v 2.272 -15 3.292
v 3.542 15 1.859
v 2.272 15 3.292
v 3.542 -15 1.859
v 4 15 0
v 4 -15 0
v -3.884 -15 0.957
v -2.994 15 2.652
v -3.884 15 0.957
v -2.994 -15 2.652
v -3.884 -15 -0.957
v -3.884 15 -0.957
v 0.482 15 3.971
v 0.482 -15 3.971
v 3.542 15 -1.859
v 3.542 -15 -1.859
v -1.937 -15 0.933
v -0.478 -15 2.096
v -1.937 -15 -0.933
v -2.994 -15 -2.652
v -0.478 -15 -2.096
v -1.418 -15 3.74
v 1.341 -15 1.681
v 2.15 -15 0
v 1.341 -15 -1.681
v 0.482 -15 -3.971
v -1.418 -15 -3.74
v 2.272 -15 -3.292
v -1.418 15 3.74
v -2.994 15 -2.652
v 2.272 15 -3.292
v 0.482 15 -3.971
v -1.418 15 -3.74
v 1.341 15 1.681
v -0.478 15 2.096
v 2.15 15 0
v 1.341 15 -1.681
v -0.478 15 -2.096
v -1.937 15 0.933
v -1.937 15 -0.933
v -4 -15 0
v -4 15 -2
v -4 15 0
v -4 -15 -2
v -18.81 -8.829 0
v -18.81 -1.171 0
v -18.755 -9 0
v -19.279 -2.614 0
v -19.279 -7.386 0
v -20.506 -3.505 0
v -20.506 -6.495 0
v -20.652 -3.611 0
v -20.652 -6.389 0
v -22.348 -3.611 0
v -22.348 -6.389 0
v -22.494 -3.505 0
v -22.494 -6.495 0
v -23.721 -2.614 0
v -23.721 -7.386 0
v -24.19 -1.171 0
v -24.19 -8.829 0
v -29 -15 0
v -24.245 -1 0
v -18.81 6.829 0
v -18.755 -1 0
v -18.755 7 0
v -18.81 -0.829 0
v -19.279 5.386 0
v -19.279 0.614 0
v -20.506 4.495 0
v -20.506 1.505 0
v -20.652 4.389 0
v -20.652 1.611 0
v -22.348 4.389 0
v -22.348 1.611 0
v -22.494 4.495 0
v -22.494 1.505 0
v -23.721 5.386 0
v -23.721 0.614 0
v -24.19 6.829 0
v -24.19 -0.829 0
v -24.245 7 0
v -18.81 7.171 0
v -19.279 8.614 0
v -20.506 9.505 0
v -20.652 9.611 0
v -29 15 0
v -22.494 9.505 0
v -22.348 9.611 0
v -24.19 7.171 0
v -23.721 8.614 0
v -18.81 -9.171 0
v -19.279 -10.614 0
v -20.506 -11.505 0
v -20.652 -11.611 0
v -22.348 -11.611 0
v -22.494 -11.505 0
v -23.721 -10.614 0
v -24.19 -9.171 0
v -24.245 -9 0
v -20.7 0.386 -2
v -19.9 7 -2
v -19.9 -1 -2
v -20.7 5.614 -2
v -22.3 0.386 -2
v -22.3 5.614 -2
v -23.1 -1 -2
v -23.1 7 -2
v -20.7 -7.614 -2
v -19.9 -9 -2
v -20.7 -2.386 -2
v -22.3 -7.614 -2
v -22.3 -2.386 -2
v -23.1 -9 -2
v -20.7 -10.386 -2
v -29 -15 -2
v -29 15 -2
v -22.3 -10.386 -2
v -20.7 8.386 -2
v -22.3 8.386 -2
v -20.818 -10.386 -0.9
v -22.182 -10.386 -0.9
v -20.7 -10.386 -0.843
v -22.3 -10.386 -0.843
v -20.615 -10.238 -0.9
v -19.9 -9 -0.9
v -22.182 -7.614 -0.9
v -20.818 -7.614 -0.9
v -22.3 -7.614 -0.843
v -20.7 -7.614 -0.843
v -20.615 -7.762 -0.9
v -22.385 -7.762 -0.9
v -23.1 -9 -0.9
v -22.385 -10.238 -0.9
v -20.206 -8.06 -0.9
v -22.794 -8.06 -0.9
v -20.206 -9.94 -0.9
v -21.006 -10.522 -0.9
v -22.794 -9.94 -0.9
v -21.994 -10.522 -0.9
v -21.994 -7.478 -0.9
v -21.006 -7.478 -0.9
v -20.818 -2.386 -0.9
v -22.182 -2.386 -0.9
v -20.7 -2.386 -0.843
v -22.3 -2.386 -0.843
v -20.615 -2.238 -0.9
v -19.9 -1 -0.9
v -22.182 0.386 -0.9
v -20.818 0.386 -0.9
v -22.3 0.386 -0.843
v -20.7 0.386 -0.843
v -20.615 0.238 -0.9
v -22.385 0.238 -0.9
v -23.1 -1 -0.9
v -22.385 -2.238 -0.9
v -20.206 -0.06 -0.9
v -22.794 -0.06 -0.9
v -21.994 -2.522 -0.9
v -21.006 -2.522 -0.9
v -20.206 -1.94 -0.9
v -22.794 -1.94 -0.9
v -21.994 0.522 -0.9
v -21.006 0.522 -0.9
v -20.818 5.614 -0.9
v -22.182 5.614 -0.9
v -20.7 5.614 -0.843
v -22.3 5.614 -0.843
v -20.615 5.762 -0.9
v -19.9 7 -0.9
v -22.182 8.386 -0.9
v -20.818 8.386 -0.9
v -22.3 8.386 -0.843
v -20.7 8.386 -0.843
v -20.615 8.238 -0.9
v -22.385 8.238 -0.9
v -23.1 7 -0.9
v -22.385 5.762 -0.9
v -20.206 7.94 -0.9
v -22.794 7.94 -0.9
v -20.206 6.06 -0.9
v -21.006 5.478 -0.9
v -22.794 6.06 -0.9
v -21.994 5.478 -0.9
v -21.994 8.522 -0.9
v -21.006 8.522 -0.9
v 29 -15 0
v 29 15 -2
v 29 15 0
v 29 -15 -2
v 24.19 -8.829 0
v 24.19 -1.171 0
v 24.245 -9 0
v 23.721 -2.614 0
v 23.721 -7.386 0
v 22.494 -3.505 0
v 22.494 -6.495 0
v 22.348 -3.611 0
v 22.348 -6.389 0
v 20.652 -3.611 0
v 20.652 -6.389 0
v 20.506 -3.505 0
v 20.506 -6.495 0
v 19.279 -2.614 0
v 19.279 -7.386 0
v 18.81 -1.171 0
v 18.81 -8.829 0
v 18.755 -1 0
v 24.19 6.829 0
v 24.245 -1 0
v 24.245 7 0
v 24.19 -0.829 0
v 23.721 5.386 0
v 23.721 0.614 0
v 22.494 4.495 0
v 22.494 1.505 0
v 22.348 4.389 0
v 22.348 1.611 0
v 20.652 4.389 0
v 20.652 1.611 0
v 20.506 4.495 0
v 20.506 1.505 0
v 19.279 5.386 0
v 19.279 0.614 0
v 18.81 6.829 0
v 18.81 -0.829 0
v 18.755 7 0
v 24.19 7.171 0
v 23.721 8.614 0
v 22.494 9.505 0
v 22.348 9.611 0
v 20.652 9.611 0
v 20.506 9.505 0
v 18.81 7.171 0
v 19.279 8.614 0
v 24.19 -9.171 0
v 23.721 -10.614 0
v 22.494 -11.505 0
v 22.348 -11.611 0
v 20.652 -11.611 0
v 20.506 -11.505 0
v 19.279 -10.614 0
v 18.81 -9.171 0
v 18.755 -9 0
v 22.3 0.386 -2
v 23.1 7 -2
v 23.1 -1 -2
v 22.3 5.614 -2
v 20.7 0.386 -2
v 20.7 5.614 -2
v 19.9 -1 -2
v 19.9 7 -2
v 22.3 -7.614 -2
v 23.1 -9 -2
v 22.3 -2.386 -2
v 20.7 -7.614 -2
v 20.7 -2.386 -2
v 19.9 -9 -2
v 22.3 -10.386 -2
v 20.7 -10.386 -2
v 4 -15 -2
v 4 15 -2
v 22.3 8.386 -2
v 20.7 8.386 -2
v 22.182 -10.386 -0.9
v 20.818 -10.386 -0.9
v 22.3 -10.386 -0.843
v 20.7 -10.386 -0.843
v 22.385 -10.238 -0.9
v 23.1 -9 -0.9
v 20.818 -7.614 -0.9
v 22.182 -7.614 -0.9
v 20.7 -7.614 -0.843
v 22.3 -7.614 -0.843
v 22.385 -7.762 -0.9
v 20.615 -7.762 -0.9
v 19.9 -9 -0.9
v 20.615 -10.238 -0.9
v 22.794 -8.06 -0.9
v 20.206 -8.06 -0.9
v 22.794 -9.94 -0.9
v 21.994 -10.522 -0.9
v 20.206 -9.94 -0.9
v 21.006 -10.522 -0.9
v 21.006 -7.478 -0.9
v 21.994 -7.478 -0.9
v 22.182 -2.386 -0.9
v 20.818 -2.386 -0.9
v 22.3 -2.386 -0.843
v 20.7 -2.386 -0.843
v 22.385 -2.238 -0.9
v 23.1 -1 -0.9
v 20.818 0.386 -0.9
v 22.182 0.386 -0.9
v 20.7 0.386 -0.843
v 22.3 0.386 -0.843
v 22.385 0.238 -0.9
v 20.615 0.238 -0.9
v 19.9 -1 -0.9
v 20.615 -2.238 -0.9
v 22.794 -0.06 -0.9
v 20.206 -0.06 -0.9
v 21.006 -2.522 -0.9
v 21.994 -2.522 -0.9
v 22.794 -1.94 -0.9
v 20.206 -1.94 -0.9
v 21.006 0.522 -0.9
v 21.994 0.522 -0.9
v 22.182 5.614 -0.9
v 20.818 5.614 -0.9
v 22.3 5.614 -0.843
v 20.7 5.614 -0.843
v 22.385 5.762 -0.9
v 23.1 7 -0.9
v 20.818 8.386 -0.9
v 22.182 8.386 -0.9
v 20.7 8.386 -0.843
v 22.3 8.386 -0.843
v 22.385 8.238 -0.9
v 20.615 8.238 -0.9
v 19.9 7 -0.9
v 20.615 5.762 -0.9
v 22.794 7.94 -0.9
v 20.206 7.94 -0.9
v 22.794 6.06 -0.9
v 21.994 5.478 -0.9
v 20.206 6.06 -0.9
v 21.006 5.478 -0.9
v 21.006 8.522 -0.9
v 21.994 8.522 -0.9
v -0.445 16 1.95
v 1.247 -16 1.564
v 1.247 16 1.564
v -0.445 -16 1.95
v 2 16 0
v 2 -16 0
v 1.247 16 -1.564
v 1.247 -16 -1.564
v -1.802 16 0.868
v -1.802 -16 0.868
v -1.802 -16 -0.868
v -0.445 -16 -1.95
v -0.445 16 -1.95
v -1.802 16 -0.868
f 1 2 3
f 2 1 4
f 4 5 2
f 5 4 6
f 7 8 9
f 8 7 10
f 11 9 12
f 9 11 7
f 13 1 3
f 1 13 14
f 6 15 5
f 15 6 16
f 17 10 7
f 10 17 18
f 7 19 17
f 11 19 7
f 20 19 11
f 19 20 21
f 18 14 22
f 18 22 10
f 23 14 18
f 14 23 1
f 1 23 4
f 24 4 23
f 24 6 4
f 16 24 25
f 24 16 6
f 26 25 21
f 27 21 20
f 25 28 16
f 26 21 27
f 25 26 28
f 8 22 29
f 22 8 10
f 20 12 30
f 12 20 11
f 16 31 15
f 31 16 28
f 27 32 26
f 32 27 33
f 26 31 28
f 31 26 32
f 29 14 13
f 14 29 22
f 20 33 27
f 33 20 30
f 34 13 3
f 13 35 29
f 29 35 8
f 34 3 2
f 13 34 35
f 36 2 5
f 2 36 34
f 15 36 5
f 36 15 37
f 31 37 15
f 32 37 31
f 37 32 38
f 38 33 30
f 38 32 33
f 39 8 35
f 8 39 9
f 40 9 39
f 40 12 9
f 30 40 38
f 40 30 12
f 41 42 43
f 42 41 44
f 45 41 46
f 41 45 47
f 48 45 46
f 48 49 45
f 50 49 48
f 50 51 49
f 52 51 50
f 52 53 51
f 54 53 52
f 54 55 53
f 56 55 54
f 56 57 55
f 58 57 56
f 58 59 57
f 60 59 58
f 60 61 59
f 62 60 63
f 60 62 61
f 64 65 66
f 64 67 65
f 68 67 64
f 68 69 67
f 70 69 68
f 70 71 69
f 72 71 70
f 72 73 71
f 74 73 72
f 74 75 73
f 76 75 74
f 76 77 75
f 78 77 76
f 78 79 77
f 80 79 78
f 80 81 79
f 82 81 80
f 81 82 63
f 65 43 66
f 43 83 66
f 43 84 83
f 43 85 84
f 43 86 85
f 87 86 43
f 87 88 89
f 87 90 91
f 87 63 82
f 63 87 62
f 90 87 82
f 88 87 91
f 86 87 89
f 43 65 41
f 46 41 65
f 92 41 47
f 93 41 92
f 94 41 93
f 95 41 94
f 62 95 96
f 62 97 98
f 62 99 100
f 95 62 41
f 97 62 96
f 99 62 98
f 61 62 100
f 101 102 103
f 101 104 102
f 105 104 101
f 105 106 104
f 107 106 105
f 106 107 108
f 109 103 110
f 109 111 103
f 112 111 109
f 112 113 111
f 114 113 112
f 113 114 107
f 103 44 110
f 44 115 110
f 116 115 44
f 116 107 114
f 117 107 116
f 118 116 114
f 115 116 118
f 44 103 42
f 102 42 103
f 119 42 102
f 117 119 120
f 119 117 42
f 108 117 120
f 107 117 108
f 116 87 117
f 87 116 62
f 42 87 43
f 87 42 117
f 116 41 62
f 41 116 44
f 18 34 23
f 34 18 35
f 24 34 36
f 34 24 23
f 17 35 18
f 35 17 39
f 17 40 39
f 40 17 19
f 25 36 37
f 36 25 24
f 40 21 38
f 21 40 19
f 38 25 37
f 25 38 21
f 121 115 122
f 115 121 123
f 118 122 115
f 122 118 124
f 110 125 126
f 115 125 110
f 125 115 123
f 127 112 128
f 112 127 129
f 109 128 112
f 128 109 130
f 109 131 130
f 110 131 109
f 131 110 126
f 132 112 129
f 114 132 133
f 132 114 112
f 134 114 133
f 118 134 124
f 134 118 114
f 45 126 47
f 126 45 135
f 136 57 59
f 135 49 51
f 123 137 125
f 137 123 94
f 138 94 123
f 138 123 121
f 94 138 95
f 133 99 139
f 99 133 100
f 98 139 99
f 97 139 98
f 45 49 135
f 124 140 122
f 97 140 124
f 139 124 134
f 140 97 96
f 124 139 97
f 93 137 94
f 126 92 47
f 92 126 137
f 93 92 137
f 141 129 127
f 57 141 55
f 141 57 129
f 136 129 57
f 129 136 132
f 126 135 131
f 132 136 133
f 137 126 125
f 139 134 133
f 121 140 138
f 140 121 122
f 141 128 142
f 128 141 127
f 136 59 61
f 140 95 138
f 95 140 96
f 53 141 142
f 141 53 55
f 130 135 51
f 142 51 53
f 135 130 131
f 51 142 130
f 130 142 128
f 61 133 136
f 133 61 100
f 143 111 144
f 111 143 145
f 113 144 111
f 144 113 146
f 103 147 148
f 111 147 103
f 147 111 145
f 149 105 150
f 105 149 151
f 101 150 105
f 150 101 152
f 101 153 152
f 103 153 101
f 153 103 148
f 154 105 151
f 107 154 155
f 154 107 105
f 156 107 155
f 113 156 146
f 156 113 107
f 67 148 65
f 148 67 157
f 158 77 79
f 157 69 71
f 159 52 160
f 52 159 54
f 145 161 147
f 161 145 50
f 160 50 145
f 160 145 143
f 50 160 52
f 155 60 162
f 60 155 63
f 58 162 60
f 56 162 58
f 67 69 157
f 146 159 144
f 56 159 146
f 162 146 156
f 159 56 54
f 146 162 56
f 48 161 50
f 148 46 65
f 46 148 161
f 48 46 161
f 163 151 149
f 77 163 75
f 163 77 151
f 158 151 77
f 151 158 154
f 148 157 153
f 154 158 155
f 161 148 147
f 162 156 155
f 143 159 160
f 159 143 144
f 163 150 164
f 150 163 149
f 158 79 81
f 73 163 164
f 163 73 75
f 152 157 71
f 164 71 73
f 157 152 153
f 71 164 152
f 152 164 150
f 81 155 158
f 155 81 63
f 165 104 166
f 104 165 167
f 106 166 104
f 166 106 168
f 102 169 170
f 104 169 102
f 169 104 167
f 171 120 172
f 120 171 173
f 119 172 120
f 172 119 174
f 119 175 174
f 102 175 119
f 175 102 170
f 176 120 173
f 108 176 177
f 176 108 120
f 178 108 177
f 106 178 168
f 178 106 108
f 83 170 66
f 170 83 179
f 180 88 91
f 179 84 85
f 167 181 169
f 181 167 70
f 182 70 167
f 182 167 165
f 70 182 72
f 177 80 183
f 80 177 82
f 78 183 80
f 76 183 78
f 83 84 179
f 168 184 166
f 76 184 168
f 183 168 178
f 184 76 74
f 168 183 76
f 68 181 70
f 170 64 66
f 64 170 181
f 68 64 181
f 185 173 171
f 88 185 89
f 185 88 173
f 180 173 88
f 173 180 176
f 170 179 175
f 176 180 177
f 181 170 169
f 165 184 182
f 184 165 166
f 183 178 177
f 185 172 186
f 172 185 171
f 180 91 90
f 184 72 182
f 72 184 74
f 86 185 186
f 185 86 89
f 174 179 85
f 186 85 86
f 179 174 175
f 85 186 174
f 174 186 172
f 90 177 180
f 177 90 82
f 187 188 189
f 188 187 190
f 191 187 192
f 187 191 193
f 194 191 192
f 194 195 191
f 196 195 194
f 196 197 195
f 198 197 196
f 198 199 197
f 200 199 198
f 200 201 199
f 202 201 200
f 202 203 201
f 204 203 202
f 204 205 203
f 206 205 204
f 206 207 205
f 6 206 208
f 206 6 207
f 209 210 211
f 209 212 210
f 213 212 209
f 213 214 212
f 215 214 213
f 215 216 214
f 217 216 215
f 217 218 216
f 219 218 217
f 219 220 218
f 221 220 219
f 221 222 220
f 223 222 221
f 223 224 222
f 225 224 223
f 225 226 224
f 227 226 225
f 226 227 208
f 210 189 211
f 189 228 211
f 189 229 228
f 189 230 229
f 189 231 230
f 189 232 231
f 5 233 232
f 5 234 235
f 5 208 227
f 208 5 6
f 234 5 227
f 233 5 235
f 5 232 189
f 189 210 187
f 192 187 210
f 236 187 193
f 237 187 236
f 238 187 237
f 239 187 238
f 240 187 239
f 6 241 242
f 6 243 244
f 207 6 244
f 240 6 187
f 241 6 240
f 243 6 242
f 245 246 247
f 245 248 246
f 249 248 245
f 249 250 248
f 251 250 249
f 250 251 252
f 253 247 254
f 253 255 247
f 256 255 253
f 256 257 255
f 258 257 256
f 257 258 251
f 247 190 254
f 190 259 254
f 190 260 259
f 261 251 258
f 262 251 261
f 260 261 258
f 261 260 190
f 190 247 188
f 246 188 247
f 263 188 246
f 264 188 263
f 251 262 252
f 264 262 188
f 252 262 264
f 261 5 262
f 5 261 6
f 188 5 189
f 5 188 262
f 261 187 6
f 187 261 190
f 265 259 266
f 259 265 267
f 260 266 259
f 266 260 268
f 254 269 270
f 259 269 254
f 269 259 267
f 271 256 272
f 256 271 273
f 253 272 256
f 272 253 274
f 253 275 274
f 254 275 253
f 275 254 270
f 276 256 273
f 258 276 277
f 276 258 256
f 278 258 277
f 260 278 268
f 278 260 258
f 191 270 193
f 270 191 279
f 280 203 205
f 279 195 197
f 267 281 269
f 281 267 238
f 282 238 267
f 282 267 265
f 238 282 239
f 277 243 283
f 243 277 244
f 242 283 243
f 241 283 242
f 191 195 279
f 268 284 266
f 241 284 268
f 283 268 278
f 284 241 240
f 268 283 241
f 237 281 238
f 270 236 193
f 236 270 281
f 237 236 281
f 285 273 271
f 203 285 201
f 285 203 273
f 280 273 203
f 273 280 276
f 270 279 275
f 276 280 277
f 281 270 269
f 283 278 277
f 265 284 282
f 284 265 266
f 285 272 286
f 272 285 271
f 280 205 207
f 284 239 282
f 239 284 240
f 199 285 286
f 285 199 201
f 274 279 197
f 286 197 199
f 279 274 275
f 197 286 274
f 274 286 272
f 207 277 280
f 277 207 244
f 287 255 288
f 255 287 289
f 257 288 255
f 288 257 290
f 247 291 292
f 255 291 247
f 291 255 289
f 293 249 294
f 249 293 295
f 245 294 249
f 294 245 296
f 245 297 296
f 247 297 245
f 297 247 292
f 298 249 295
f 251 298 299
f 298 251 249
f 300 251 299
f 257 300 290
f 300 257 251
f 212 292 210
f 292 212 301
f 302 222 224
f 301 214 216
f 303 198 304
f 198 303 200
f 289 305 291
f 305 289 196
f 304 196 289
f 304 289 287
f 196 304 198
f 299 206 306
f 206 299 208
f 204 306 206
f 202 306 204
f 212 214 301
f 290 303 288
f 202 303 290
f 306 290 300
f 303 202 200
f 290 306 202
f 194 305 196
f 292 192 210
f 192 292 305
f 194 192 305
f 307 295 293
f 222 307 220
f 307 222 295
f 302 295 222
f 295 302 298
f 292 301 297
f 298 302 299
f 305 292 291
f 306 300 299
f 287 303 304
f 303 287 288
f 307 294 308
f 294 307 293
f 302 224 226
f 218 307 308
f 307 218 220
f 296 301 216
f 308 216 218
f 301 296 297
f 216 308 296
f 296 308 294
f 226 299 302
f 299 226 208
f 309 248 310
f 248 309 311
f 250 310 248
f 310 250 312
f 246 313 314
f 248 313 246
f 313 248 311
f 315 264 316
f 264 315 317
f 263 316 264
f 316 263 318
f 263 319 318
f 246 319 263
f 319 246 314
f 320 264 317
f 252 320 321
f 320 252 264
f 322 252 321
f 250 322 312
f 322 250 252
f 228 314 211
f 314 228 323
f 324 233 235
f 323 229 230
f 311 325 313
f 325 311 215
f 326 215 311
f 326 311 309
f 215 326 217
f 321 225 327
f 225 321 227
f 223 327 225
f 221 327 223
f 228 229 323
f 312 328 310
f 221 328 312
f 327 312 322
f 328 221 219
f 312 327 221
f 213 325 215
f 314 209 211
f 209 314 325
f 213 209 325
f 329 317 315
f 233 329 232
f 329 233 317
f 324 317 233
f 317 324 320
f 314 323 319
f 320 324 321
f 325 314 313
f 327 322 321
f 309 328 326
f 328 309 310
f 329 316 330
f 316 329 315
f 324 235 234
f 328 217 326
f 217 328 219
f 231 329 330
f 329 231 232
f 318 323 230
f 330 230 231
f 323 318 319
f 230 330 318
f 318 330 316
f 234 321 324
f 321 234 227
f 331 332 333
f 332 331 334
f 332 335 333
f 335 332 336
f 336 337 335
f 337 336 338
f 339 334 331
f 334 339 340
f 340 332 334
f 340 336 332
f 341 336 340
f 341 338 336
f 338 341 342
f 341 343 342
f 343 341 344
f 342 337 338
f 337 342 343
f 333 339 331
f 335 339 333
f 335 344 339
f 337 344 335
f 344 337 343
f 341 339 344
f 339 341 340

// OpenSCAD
// バット蝶番（180°開いた状態）

// パラメータ
leaf_width = 25;    // 板の幅
leaf_height = 30;   // 板の高さ
leaf_thickness = 2; // 板の厚み
knuckle_od = 8;     // knuckle外径
pin_diameter = 4;   // ピン軸径
pin_clearance = 0.3; // ピンクリアランス
knuckle_id = pin_diameter + pin_clearance; // knuckle内径
pin_length = 32;    // ピン軸長さ
knuckle_length = 6; // 各knuckle長さ

// 皿穴パラメータ
screw_hole_dia = 3.2;
countersink_dia = 6;
countersink_depth = 1;
screw_spacing = 8;

module leaf_with_knuckles(knuckle_positions, side) {
    difference() {
        union() {
            // メイン板（180°開いた状態で同一平面）
            translate([side * (leaf_width/2 + knuckle_od/2), 0, -leaf_thickness/2])
                cube([leaf_width, leaf_height, leaf_thickness], center=true);
            
            // knuckles（Y軸方向に配置）
            for (pos = knuckle_positions) {
                translate([0, pos, 0])
                    rotate([90, 0, 0])
                    cylinder(h=knuckle_length, d=knuckle_od, center=true);
            }
        }
        
        // knuckle穴（ピン軸用、Y軸方向）
        for (pos = knuckle_positions) {
            translate([0, pos, 0])
                rotate([90, 0, 0])
                cylinder(h=knuckle_length+0.1, d=knuckle_id, center=true);
        }
        
        // 皿穴（knuckleから離れた側）
        for (i = [0:2]) {
            screw_y = -leaf_height/2 + 6 + i * screw_spacing;
            translate([side * (leaf_width * 0.7 + knuckle_od/2), screw_y, -leaf_thickness/2]) {
                // 貫通穴
                cylinder(h=leaf_thickness+1, d=screw_hole_dia, center=true);
                // 皿穴（表面側）
                translate([0, 0, leaf_thickness/2 - countersink_depth + 0.1])
                    cylinder(h=countersink_depth+0.1, d1=screw_hole_dia, d2=countersink_dia);
            }
        }
    }
}

// knuckle位置（Y座標、30mmを5等分）
// -12, -6, 0, 6, 12 (各6mm間隔)

// 左板（x<0側、knuckle位置: 1番目、3番目、5番目）
left_knuckle_positions = [-12, 0, 12];
leaf_with_knuckles(left_knuckle_positions, -1);

// 右板（x>0側、knuckle位置: 2番目、4番目）
right_knuckle_positions = [-6, 6];
leaf_with_knuckles(right_knuckle_positions, 1);

// ピン軸（Y軸方向、32mm長さ）
rotate([90, 0, 0])
cylinder(h=pin_length, d=pin_diameter, center=true);
